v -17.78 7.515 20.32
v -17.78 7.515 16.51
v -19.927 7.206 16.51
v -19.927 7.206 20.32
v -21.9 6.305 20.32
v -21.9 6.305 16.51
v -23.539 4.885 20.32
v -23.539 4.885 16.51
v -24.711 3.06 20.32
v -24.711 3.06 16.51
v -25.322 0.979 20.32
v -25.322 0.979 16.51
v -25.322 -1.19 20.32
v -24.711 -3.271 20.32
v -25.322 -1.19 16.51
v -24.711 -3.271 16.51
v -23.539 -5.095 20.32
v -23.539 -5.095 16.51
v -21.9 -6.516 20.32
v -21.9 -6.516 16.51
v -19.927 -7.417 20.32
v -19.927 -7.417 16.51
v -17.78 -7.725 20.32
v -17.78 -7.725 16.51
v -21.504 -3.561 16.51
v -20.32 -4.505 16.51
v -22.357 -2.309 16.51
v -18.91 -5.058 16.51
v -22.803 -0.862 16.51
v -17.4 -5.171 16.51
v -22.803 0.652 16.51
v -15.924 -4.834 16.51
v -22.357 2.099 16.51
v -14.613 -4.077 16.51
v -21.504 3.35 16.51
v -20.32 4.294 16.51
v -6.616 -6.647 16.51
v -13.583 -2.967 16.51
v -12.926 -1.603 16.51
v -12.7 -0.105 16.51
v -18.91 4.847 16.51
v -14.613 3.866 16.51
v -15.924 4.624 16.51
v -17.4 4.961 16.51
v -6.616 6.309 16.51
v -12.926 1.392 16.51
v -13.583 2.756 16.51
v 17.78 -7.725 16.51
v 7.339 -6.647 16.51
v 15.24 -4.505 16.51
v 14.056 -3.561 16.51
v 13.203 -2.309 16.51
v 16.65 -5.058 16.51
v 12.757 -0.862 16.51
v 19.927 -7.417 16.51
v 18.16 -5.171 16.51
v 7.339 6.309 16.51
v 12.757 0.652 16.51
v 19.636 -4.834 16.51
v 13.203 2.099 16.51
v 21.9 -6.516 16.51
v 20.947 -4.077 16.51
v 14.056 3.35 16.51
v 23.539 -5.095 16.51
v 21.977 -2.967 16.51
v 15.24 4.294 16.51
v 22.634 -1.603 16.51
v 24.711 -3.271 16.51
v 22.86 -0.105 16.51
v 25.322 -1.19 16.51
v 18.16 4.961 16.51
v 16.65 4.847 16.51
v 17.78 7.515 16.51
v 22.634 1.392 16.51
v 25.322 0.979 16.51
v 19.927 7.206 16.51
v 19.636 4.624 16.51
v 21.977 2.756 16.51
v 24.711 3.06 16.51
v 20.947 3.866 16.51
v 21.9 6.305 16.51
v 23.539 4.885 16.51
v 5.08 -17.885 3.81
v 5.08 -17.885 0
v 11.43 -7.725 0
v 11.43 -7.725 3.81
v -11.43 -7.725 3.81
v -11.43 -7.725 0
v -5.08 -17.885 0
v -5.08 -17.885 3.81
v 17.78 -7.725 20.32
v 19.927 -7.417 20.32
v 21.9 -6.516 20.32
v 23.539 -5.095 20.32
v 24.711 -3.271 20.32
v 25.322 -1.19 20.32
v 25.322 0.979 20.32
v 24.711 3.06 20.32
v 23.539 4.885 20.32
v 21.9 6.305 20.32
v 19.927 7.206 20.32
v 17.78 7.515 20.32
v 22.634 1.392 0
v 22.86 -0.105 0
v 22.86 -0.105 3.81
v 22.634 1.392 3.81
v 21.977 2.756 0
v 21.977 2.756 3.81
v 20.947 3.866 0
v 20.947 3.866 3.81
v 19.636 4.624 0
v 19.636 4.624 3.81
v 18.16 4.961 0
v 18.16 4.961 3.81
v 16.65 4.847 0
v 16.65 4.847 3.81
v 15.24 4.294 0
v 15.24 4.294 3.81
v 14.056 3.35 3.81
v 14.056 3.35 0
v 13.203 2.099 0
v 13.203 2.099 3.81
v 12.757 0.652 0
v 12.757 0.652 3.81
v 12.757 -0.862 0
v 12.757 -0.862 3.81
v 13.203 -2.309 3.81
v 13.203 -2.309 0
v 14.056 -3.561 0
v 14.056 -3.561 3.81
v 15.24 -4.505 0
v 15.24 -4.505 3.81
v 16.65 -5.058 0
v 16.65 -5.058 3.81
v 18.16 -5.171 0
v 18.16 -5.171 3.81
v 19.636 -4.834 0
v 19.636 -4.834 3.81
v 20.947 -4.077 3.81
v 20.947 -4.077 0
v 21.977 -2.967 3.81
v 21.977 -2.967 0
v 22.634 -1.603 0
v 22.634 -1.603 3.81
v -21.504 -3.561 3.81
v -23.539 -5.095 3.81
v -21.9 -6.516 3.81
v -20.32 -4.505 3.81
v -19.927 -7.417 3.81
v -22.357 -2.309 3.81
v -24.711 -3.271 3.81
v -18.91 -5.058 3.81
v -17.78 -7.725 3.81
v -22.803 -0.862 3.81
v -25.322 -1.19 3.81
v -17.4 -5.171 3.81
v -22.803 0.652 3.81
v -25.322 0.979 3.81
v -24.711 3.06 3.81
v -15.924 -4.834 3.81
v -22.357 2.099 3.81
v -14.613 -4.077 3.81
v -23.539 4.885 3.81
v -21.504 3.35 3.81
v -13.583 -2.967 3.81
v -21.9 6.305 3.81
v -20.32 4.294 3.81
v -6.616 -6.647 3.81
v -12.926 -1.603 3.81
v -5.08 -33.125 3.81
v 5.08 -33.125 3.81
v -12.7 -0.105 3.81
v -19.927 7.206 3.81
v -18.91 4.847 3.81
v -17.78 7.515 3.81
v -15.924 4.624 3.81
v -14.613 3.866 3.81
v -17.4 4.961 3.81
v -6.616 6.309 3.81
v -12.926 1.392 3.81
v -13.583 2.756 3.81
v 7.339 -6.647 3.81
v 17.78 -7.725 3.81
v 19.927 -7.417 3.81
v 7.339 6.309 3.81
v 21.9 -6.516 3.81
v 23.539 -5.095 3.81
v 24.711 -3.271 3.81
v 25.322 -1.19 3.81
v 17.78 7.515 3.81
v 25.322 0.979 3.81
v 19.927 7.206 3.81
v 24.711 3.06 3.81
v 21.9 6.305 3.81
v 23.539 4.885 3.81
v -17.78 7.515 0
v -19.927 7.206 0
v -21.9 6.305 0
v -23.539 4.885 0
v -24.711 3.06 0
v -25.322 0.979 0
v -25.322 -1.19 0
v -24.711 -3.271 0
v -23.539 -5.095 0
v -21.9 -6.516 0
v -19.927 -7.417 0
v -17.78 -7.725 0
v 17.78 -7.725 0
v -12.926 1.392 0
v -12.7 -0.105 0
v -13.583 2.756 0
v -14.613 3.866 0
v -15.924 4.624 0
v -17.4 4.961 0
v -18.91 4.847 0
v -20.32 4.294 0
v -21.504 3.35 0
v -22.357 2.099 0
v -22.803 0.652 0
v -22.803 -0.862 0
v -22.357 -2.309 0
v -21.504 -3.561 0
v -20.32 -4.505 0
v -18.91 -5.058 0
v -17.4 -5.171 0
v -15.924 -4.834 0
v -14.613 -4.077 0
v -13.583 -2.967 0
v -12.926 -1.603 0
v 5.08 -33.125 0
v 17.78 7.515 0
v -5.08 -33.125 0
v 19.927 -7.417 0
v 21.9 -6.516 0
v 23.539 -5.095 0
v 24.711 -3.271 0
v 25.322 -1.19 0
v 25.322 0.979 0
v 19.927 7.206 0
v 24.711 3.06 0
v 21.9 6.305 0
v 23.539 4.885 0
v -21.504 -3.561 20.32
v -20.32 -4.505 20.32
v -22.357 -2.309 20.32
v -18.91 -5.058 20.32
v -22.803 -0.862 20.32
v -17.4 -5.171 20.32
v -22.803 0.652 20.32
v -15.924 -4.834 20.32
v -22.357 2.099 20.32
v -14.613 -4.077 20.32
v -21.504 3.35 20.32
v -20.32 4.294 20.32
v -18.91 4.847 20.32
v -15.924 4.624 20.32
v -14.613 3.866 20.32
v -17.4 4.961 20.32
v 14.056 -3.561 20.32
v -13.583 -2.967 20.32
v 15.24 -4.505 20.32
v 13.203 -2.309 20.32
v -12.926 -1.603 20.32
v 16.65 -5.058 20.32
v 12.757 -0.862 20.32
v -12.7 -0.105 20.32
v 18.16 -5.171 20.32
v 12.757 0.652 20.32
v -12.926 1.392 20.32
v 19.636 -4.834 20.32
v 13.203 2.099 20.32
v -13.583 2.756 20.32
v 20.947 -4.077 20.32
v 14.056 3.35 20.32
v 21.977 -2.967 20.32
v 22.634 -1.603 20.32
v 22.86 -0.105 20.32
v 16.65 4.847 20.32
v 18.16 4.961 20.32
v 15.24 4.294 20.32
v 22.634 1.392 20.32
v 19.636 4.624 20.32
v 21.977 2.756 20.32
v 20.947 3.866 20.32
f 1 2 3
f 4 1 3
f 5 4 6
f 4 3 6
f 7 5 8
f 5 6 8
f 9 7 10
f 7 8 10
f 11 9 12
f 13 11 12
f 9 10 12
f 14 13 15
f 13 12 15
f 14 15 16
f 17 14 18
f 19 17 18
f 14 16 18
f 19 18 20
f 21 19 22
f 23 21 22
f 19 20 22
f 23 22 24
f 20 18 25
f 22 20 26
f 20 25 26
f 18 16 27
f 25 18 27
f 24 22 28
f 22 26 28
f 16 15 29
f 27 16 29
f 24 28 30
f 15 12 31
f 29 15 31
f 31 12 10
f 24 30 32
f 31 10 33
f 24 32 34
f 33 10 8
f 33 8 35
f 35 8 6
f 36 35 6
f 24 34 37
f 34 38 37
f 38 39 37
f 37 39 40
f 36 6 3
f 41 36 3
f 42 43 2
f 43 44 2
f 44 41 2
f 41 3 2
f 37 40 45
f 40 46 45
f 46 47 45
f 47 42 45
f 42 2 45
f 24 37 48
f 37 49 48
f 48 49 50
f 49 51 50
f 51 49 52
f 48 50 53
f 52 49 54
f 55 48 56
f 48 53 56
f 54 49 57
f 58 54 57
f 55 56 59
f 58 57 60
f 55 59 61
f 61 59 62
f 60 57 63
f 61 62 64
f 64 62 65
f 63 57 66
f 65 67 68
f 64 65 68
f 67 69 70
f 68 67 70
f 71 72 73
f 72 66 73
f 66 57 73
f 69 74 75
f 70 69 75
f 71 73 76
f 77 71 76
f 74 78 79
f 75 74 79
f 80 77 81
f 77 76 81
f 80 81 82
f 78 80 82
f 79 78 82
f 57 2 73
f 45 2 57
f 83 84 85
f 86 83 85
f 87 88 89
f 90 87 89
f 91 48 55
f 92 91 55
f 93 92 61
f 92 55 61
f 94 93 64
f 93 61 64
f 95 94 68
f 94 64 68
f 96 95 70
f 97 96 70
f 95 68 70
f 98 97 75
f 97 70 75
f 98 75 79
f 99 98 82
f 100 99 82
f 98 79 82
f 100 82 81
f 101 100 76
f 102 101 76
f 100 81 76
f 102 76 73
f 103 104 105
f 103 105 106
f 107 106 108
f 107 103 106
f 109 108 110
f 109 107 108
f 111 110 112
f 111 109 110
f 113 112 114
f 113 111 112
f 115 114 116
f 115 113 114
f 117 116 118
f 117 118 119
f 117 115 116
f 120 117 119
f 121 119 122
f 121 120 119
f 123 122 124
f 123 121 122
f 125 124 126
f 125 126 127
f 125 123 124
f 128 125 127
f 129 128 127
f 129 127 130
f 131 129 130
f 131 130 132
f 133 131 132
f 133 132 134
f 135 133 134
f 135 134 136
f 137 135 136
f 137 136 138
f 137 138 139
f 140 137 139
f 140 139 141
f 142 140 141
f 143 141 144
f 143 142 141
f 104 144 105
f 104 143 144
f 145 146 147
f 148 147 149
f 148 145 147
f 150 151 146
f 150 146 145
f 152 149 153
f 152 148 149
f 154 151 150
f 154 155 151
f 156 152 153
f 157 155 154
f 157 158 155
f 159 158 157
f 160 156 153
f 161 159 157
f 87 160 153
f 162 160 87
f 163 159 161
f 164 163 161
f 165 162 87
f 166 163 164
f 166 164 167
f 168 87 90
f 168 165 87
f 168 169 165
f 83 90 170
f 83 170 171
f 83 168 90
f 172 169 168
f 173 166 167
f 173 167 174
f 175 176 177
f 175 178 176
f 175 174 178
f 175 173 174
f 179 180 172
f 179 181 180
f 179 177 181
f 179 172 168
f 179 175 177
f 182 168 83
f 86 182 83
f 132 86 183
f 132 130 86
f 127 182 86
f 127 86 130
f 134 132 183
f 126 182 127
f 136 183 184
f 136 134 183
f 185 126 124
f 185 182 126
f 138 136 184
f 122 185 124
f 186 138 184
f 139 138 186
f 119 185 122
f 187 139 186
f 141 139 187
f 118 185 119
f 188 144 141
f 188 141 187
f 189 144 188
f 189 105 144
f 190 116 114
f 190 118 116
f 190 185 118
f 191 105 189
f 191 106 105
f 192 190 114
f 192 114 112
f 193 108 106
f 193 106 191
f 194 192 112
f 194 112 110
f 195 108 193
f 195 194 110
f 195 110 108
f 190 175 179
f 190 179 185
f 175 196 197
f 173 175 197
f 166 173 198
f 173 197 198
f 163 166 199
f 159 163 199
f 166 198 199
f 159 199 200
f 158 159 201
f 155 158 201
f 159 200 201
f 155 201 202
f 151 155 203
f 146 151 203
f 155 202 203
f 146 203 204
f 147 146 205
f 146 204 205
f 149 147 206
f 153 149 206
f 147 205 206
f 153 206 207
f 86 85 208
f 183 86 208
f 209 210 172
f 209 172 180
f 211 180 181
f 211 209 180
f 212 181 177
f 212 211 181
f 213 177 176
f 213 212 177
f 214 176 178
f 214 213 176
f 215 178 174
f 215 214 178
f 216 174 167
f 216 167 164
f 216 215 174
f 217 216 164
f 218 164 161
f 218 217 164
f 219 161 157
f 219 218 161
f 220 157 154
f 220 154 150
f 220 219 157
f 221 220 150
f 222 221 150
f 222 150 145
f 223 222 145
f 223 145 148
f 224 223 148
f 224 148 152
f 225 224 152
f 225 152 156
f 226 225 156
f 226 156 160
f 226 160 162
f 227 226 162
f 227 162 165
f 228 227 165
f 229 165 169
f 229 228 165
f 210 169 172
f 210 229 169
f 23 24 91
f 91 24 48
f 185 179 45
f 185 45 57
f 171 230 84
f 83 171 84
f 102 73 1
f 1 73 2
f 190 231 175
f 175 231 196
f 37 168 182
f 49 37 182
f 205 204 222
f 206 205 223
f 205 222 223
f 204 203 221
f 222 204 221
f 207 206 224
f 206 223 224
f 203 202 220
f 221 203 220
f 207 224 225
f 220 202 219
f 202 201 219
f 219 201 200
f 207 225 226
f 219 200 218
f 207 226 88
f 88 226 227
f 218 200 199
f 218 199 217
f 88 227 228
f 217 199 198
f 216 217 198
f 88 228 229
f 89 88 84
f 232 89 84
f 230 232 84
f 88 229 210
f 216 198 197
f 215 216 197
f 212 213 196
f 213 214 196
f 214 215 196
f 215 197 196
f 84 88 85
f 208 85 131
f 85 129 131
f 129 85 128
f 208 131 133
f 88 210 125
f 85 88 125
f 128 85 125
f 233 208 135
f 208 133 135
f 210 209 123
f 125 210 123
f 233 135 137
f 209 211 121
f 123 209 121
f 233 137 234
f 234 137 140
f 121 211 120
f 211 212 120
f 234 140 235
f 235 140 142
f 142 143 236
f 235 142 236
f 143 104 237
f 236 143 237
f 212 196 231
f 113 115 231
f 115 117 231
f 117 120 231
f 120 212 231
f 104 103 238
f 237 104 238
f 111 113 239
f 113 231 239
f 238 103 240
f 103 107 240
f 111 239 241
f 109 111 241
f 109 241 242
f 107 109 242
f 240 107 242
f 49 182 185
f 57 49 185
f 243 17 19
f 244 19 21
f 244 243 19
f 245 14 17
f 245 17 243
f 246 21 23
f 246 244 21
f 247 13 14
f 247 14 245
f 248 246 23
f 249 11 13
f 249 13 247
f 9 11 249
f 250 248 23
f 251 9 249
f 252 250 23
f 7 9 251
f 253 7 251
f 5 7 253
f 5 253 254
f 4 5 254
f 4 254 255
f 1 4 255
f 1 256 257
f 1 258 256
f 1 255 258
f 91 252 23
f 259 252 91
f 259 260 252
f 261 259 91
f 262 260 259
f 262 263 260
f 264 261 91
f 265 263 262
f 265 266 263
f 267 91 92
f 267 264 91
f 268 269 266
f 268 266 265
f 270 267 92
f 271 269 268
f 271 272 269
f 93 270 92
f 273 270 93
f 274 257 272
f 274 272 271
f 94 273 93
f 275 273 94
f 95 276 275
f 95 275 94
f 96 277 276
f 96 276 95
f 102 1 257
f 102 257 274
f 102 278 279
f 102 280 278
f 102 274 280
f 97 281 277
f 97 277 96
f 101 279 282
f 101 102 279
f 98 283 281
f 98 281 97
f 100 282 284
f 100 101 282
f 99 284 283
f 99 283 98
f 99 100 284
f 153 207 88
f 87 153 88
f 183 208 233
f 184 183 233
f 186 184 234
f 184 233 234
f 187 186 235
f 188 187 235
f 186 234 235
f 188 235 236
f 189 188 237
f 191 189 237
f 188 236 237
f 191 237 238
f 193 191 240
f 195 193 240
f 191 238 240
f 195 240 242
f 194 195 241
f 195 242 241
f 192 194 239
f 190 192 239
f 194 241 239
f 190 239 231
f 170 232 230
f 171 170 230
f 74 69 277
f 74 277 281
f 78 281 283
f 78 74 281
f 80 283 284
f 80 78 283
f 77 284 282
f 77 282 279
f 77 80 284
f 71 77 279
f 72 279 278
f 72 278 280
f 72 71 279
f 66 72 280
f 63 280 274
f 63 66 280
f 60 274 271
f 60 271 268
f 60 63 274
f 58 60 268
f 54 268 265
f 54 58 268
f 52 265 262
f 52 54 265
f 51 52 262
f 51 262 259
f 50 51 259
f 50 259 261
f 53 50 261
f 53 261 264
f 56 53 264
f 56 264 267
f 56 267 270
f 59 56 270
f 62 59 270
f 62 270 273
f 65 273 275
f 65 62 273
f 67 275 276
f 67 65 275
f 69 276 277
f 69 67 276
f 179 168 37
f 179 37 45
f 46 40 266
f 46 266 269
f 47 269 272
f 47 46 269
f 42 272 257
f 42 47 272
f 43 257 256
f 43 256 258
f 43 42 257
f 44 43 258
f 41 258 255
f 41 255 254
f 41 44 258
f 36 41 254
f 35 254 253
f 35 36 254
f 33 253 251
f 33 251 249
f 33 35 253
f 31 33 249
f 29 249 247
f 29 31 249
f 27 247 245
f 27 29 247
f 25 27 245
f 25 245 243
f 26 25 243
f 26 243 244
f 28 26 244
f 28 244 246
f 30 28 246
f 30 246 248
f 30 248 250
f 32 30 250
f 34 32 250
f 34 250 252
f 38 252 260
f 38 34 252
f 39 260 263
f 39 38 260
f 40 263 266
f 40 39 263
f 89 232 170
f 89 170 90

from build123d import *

# Parameters (mm, degrees)
F0_R     = 5.08
F0_W     = 10.16
F0_H     = 15.24
F1_DEPTH = 3.81
F2_W     = 13.9550012536
F2_H     = 12.9558886401
F3_DEPTH = 12.7
F4_R     = 5.08
F5_DEPTH = 3.81


with BuildPart() as f1:
    # F0 (on Top) → F1 (new body)
    with BuildSketch(Plane.XY):
        with BuildLine():
            Line((17.78, 7.5147451945), (-17.78, 7.5147451945))
            ThreePointArc((-17.78, 7.5147451945), (-25.4, -0.1052548055), (-17.78, -7.7252548055))
            Line((-17.78, -7.7252548055), (-11.43, -7.7252548055))
            Line((-11.43, -7.7252548055), (-5.08, -7.7252548055))
            Line((-5.08, -7.7252548055), (0, -7.7252548055))
            Line((0, -7.7252548055), (5.08, -7.7252548055))
            Line((5.08, -7.7252548055), (11.43, -7.7252548055))
            Line((11.43, -7.7252548055), (17.78, -7.7252548055))
            ThreePointArc((17.78, -7.7252548055), (25.4, -0.1052548055), (17.78, 7.5147451945))
        make_face()
        with Locations((-17.78, -0.1052548055)):
            Circle(F0_R, mode=Mode.SUBTRACT)
        with Locations((17.78, -0.1052548055)):
            Circle(F0_R, mode=Mode.SUBTRACT)
        Polygon((-5.08, -7.7252548055), (-11.43, -7.7252548055), (-5.08, -17.8852548055), align=None)
        Polygon((5.08, -17.8852548055), (11.43, -7.7252548055), (5.08, -7.7252548055), align=None)
        Polygon((0, -7.7252548055), (-5.08, -7.7252548055), (-5.08, -17.8852548055), (5.08, -17.8852548055), (5.08, -7.7252548055), align=None)
        with Locations((0, -25.5052548055)):
            Rectangle(F0_W, F0_H)
    extrude(amount=F1_DEPTH)

    # F2 (on face) → F3 (join)
    with BuildSketch(Plane.XY.offset(3.81)):
        with Locations((0.3611810971, -0.169222476)):
            Rectangle(F2_W, F2_H)
    extrude(amount=F3_DEPTH)

    # F4 (on face) → F5 (join)
    with BuildSketch(Plane.XY.offset(16.51)):
        with BuildLine():
            Line((17.78, 7.5147451945), (-17.78, 7.5147451945))
            ThreePointArc((-17.78, 7.5147451945), (-25.4, -0.1052548055), (-17.78, -7.7252548055))
            Line((-17.78, -7.7252548055), (-11.43, -7.7252548055))
            Line((-11.43, -7.7252548055), (11.43, -7.7252548055))
            Line((11.43, -7.7252548055), (17.78, -7.7252548055))
            ThreePointArc((17.78, -7.7252548055), (25.4, -0.1052548055), (17.78, 7.5147451945))
        make_face()
        with Locations((-17.78, -0.1052548055)):
            Circle(F4_R, mode=Mode.SUBTRACT)
        with Locations((17.78, -0.1052548055)):
            Circle(F4_R, mode=Mode.SUBTRACT)
    extrude(amount=F5_DEPTH)


solid = f1.part
